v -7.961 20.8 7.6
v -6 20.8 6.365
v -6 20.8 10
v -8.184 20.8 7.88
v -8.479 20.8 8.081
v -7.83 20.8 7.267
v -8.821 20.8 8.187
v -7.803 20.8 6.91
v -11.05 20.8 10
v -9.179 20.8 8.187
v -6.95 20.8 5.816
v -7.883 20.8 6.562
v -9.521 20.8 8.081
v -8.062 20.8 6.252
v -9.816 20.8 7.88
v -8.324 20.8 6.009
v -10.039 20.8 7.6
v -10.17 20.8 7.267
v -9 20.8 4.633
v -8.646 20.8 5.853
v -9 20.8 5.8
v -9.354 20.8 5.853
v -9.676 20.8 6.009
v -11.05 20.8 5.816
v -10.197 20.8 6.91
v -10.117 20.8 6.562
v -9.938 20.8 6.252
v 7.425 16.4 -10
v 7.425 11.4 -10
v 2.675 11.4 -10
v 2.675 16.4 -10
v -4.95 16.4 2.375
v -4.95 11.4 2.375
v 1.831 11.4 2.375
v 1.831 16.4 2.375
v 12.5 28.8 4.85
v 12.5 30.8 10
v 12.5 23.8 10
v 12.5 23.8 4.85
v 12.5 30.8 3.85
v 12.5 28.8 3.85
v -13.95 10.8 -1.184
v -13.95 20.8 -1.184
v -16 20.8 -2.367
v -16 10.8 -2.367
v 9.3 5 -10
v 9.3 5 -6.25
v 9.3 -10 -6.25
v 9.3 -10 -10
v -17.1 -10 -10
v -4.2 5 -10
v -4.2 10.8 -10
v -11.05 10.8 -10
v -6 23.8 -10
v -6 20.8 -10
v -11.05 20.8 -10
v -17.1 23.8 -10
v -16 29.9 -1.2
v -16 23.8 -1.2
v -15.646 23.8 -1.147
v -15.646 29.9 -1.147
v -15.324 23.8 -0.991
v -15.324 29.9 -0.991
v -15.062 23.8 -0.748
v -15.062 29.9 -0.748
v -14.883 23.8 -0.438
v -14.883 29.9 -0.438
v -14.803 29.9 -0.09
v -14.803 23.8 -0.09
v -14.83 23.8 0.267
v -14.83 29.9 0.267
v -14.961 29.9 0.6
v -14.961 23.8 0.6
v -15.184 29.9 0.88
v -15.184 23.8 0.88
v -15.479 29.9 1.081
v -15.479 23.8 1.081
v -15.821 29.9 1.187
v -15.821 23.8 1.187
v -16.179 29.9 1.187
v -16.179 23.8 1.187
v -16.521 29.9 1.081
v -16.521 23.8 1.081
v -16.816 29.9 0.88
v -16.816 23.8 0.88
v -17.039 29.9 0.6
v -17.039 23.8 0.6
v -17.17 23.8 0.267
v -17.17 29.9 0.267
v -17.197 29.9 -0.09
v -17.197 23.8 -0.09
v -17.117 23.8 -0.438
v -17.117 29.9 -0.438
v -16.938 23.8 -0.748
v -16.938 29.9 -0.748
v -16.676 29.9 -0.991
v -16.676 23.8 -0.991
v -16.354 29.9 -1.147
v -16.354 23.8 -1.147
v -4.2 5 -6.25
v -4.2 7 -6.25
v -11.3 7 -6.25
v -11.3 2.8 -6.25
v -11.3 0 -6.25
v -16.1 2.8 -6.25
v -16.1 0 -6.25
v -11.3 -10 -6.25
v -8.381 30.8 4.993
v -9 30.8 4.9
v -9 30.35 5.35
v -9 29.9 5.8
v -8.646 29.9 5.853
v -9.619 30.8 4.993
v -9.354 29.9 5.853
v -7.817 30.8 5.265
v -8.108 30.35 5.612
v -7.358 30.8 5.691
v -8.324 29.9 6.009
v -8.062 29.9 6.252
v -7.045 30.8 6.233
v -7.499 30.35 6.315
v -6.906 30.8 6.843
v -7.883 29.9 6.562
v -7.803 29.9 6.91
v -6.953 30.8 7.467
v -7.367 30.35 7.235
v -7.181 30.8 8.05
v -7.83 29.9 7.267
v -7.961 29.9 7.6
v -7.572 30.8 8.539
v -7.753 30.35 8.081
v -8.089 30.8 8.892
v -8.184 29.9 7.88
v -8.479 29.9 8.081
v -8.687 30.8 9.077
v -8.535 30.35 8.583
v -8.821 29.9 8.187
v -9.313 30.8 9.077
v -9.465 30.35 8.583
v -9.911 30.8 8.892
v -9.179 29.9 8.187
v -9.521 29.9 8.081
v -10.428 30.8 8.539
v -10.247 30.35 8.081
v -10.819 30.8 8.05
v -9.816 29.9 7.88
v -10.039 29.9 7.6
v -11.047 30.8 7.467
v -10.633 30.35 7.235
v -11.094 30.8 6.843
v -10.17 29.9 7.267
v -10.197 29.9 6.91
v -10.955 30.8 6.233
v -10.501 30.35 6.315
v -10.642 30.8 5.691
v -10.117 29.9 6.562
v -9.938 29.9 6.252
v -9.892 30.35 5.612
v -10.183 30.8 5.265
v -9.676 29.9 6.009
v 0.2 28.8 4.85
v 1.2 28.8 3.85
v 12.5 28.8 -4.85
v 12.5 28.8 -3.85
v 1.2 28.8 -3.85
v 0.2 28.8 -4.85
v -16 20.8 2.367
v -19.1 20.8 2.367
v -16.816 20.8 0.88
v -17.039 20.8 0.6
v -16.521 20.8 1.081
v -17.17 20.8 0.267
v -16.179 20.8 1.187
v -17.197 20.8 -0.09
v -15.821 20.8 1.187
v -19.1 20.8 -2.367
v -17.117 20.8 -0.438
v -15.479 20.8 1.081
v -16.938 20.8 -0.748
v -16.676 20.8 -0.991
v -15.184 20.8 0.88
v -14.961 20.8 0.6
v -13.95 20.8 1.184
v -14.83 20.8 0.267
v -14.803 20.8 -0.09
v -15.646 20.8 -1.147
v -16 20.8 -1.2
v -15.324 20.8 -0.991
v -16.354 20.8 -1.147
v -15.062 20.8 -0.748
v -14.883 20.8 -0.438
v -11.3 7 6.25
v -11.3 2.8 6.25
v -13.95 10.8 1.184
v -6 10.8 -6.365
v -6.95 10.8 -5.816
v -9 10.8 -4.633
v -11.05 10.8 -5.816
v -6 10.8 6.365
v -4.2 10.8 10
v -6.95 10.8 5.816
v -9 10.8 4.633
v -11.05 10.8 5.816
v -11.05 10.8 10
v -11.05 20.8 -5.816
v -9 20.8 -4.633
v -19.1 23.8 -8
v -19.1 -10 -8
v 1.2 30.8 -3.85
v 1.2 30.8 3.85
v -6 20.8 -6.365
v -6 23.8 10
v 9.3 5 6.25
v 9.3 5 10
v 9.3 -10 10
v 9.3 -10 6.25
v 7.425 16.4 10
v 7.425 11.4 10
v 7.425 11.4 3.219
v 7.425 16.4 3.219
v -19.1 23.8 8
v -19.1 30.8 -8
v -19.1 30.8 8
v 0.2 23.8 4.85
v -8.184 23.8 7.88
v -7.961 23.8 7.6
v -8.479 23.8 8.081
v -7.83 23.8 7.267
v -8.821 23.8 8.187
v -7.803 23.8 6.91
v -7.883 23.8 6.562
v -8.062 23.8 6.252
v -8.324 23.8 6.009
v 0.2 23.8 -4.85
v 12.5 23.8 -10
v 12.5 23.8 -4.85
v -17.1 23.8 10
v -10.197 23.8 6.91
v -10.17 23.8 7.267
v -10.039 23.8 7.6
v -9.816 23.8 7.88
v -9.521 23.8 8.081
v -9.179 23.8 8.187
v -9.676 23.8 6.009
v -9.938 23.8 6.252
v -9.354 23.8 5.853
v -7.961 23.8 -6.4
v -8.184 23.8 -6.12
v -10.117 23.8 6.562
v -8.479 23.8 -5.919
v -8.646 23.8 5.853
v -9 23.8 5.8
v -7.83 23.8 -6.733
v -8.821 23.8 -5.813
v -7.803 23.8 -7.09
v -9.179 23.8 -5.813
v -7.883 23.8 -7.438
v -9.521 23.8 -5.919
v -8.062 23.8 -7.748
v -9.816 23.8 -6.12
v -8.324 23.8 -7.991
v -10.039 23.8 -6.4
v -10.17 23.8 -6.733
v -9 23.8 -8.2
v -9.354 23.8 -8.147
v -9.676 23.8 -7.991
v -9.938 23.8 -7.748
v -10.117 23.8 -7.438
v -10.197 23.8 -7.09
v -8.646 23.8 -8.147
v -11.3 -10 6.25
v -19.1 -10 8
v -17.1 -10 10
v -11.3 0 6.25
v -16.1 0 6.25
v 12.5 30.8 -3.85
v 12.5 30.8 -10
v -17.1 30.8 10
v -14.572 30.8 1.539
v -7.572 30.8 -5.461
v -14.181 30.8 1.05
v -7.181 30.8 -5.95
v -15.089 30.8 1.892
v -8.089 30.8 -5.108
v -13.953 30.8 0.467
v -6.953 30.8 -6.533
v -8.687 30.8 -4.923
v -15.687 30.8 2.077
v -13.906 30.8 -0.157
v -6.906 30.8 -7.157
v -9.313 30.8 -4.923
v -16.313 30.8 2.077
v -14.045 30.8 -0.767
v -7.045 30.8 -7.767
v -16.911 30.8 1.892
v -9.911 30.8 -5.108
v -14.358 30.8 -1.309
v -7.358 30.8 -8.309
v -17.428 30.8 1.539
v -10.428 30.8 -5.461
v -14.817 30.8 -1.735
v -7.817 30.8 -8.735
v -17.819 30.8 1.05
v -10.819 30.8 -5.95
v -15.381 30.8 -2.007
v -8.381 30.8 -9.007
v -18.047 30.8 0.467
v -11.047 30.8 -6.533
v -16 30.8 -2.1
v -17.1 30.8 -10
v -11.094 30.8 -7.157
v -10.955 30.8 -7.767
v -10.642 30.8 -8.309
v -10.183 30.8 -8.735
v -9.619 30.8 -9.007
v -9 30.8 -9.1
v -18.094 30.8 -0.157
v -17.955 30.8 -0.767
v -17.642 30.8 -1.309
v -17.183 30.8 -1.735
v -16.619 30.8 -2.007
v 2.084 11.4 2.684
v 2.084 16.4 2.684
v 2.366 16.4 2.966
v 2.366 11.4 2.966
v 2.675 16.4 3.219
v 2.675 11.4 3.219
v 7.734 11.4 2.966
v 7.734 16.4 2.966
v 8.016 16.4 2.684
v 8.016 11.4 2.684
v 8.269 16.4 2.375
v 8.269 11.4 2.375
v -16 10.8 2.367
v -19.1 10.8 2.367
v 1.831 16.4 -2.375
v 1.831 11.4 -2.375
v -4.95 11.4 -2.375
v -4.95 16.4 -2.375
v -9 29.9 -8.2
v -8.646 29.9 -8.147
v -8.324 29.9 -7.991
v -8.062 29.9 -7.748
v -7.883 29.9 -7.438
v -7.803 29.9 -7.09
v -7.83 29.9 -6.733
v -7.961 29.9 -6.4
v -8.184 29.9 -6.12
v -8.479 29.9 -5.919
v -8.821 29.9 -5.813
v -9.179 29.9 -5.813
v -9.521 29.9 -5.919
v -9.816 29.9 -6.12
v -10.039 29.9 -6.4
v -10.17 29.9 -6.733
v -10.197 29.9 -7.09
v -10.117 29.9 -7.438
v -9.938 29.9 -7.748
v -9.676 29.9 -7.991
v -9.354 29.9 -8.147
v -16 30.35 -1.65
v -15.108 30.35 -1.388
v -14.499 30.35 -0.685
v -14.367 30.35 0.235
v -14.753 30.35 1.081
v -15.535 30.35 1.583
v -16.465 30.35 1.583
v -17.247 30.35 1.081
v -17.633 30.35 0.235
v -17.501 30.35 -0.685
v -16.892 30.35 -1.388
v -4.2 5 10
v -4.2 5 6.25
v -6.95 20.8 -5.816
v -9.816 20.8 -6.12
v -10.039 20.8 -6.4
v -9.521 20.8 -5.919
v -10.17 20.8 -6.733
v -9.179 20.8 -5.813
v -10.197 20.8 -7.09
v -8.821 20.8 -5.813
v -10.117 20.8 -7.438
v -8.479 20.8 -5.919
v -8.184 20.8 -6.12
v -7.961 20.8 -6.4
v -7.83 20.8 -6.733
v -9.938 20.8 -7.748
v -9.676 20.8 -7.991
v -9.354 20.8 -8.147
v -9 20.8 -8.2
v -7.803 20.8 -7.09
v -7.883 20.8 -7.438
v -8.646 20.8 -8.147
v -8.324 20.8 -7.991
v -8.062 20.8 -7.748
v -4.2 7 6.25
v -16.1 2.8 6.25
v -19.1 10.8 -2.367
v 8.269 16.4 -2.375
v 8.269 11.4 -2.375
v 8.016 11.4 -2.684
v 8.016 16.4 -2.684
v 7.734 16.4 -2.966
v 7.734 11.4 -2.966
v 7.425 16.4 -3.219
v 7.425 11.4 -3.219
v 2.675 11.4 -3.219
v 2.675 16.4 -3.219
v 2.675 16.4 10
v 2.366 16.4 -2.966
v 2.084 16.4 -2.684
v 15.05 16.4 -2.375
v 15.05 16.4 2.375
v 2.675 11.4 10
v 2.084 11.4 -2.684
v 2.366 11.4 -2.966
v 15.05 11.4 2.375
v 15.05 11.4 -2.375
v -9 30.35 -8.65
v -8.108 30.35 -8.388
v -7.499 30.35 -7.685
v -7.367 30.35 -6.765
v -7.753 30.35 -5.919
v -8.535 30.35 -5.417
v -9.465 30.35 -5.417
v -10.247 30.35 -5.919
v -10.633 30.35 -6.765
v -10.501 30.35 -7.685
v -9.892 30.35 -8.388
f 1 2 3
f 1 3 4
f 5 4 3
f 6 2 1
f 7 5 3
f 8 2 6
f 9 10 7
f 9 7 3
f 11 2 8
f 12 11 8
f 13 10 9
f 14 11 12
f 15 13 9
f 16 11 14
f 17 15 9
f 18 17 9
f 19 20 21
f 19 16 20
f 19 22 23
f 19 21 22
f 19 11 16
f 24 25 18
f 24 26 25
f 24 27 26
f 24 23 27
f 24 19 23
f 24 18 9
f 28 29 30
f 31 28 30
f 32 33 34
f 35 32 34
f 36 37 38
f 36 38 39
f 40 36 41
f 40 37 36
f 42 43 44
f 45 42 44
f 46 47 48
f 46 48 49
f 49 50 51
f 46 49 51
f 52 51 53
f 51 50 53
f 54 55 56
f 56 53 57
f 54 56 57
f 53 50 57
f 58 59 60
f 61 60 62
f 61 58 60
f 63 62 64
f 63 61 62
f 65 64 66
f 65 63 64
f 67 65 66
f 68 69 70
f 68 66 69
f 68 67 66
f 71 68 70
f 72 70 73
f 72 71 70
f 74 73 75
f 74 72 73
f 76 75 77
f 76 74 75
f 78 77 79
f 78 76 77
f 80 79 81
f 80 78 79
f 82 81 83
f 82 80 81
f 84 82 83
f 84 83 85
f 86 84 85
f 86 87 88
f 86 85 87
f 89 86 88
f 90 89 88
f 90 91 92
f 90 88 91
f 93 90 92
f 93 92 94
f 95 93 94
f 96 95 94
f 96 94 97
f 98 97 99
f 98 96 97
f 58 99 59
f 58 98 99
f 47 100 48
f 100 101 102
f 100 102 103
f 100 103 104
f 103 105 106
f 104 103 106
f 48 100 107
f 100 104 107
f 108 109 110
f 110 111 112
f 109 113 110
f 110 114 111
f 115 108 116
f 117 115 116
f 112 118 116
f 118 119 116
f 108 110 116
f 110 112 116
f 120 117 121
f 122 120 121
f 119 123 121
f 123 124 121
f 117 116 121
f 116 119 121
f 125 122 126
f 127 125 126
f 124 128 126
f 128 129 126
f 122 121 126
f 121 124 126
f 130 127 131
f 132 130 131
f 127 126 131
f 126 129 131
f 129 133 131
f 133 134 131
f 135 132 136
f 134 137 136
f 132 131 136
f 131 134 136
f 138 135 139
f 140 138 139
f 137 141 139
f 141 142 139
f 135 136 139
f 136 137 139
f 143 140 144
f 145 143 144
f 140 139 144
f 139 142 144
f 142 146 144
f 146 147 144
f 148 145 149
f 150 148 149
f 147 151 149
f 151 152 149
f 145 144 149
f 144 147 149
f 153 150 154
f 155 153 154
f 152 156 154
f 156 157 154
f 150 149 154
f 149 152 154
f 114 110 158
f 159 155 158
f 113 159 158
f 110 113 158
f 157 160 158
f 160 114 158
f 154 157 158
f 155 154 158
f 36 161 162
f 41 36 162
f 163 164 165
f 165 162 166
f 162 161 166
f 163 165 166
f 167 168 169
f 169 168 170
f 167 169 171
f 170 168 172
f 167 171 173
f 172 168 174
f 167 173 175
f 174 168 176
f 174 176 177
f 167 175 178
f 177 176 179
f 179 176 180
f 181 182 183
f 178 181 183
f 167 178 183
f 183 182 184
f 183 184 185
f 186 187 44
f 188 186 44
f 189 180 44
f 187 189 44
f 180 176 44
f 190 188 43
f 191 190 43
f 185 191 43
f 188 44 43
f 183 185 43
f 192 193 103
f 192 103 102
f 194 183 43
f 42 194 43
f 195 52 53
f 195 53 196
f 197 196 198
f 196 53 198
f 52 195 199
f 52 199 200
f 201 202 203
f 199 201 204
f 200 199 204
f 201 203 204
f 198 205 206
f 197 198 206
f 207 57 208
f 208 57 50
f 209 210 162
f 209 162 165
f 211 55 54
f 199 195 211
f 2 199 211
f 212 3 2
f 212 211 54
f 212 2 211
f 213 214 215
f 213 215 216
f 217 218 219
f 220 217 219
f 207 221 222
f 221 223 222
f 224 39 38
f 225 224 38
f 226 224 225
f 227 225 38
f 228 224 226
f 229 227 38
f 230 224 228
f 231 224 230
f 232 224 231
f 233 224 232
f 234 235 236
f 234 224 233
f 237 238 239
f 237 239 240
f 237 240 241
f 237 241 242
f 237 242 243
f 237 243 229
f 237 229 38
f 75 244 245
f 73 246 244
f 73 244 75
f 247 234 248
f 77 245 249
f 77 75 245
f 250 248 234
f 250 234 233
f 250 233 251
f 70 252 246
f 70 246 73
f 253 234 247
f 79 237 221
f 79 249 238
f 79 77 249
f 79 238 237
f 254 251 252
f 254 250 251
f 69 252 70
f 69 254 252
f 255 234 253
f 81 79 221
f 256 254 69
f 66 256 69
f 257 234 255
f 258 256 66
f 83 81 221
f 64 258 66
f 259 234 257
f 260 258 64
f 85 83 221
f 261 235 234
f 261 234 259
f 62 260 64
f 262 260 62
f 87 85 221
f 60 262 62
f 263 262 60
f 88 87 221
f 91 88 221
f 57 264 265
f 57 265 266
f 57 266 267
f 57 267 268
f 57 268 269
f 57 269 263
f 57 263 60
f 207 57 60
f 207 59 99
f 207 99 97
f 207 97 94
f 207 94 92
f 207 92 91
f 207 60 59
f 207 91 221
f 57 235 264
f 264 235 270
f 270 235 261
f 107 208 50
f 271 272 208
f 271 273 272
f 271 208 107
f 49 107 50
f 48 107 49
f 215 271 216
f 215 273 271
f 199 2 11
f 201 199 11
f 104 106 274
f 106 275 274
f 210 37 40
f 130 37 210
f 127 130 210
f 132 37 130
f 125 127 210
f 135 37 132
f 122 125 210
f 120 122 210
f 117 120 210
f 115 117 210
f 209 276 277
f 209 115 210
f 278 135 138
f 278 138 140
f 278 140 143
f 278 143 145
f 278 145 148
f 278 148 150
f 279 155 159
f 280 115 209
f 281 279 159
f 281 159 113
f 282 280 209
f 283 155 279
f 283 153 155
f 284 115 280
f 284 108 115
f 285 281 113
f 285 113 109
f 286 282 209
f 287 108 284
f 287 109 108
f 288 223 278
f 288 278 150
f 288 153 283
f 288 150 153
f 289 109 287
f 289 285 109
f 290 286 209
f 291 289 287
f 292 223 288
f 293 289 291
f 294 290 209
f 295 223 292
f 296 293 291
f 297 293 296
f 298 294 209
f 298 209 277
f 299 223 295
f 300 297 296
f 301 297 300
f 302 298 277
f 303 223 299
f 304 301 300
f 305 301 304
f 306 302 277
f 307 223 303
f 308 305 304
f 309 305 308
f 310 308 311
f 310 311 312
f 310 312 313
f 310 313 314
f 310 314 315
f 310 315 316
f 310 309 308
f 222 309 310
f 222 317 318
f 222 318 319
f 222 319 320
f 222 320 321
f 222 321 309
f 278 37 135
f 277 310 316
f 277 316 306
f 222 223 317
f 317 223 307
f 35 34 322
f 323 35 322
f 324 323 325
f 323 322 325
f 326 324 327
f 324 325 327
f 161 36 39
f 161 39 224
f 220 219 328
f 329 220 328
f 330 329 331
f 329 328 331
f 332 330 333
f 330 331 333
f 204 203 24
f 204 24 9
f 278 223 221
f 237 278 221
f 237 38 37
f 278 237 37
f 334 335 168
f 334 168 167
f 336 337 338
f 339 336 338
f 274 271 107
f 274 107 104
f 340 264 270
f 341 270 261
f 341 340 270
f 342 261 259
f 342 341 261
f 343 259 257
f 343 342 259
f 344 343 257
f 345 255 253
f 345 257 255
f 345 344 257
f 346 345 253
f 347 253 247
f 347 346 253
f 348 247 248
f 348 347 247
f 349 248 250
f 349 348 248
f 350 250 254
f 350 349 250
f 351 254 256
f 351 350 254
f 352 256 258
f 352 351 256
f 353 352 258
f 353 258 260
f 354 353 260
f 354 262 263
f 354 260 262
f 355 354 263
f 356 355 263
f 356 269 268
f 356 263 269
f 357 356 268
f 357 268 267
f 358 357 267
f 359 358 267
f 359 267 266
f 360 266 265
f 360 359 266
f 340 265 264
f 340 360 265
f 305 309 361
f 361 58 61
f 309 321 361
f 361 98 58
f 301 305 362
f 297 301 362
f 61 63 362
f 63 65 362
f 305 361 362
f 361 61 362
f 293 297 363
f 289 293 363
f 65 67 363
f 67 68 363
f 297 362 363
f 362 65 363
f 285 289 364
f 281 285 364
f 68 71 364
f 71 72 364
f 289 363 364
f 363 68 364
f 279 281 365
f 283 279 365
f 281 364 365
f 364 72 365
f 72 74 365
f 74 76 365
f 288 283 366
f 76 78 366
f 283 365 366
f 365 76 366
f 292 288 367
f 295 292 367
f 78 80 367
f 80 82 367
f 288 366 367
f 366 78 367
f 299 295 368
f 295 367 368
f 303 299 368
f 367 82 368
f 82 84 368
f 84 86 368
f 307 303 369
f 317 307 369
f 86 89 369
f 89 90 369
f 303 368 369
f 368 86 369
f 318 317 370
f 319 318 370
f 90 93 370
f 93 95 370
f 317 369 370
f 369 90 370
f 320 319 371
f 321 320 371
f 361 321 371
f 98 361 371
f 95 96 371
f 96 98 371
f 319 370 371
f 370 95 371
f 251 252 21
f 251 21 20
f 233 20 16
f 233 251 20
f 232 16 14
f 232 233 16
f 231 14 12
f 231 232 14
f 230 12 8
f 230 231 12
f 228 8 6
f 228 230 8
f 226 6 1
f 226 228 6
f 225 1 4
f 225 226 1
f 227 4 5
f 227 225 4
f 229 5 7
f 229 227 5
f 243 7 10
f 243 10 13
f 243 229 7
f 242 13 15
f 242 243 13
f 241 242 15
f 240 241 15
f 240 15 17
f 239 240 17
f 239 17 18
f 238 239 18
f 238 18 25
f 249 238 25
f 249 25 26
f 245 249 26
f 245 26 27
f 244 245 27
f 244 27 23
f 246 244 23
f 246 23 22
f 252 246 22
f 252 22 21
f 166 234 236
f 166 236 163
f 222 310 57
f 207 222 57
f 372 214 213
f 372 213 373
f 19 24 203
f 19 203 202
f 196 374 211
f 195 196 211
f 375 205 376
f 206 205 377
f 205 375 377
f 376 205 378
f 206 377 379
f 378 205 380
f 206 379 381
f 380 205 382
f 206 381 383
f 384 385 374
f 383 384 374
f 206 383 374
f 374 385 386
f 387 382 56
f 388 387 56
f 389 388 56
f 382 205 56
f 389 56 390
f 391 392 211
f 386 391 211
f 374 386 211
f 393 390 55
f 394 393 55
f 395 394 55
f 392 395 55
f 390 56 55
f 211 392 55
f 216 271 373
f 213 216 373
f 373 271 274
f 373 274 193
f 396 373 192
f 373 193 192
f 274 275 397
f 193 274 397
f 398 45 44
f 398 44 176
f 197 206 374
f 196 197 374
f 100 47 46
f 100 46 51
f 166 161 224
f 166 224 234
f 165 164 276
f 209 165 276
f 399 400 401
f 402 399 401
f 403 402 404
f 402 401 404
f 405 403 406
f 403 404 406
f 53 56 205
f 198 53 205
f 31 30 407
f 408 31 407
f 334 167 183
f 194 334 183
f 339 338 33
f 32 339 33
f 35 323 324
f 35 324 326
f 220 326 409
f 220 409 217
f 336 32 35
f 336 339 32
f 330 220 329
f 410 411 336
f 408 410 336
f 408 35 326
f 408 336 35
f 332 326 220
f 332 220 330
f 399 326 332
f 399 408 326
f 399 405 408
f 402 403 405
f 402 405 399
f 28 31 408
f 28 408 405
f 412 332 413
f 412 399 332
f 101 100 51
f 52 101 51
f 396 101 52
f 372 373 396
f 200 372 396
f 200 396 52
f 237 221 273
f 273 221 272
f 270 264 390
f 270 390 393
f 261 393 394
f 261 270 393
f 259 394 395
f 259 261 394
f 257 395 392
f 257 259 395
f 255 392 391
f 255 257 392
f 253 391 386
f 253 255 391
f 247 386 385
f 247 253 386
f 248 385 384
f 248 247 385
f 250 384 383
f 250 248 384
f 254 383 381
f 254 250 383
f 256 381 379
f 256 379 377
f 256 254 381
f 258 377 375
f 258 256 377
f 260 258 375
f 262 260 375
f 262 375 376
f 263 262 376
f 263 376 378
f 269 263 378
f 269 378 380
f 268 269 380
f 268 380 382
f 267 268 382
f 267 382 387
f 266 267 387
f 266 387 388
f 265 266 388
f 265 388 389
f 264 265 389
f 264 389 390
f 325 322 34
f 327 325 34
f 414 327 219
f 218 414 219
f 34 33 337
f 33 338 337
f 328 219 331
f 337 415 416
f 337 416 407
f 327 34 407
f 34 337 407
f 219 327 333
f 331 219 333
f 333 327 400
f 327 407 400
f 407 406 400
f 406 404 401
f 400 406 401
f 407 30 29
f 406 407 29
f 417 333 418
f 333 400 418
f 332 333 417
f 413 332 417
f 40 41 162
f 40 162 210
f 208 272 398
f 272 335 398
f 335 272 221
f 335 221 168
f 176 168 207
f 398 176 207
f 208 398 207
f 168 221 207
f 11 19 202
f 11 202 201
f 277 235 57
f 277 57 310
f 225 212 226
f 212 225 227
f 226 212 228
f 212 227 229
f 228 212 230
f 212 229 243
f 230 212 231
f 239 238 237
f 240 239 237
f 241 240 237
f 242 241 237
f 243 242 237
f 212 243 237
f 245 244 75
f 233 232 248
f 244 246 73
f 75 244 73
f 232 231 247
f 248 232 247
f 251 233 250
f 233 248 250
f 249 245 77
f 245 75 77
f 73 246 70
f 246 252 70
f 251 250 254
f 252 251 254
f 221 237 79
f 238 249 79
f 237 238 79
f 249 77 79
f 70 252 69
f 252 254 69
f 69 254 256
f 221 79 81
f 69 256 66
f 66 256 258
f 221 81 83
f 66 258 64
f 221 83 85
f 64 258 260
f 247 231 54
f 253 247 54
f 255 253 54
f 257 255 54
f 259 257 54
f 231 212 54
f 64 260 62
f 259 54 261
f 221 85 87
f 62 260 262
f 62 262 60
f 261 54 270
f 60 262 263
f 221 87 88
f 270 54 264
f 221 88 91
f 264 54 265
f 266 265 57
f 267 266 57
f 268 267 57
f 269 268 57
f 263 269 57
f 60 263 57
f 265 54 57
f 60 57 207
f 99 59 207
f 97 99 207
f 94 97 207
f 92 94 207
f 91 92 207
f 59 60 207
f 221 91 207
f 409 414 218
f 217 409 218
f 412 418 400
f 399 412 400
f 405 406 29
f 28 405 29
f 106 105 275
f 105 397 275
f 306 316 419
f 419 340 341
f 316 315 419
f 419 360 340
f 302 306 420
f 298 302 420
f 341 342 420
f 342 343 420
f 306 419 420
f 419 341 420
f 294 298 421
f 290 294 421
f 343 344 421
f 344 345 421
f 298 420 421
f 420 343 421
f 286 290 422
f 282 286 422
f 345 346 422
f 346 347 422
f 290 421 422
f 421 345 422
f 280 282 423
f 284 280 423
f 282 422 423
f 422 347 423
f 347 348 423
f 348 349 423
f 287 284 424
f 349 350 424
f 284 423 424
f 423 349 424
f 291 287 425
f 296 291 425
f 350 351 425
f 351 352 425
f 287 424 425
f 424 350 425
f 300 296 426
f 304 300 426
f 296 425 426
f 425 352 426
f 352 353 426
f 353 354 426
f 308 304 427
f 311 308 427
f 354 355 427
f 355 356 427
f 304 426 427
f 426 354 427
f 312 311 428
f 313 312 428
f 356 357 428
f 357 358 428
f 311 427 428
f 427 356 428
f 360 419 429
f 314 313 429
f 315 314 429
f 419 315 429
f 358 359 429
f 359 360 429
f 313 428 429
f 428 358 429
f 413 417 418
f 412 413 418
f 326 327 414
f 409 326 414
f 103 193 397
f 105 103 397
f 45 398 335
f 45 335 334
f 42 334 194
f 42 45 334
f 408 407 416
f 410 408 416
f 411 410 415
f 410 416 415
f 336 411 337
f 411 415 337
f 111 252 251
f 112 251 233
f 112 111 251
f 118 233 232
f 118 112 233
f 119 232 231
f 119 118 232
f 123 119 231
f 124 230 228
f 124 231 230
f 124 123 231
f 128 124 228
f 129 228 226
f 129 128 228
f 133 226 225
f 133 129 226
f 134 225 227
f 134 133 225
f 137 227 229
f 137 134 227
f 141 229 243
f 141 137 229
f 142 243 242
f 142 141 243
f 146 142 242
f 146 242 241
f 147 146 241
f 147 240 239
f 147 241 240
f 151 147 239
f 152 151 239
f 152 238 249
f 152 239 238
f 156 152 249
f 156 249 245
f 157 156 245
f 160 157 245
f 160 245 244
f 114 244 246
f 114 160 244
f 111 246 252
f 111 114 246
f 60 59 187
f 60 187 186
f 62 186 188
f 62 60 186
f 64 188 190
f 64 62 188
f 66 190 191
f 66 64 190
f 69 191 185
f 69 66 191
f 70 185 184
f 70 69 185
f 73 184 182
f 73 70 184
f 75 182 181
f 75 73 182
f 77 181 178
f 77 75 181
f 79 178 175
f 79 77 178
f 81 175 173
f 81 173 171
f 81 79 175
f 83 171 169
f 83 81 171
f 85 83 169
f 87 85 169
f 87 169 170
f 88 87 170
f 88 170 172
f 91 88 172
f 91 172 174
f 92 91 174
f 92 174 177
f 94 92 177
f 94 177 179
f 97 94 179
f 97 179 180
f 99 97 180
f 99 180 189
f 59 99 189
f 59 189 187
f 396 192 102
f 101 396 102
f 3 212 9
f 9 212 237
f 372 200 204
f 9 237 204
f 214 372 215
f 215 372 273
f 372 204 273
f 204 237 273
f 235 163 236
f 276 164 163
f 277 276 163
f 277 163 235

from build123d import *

# Parameters (mm, degrees)
SKETCH1_W                = 22.6
SKETCH1_H                = 15.7
SKETCH1_H_2              = 4.2
BOSS_EXTRUDE1_DEPTH      = 6.25
BOSS_EXTRUDE2_DEPTH      = 4.4
SKETCH4_W                = 9.7
SKETCH4_H                = 9.7
BOSS_EXTRUDE3_DEPTH      = 5
BOSS_EXTRUDE9_DEPTH      = 5
SKETCH8_R                = 3.3
BOSS_EXTRUDE5_DEPTH      = 5.4
BOSS_EXTRUDE5_DRAFT      = 13
BOSS_EXTRUDE6_DEPTH      = 10
SKETCH9_W                = 9.7
SKETCH9_H                = 5
CUT_EXTRUDE1_DEPTH       = 12.3
BOSS_EXTRUDE7_REACH      = 45.909
SKETCH10_W               = 6.15
SKETCH10_H               = 2
BOSS_EXTRUDE8_START      = -19.3
SKETCH11_W               = 7.7
SKETCH11_H               = 2
BOSS_EXTRUDE8_DEPTH      = 20.3
CHAMFER1_SIZE            = 2
SURFACE_EXTRUDE1_1_BACK  = 25
SURFACE_EXTRUDE1_1_DEPTH = 35
SURFACE_EXTRUDE1_2_BACK  = 25
SURFACE_EXTRUDE1_2_DEPTH = 35
CUT_EXTRUDE2_START       = -3
CUT_EXTRUDE2_DEPTH       = 10
CUT_EXTRUDE3_START       = -12.4
SKETCH15_R               = 1.2
CUT_EXTRUDE3_DEPTH       = 10
CHAMFER2_SIZE            = 0.9
SKETCH16_W               = 3.75
SKETCH16_H               = 15
CUT_EXTRUDE4_DEPTH       = 2
MOVE_START               = -6
MOVE_FACE1_DEPTH         = 1.8


# Read off the part's stored shape, not the designer's step: Move Face1
with BuildPart() as part:
    # Sketch1 → Boss-Extrude1 (new, symmetric)
    with BuildSketch(Plane.XY):
        with Locations((0, -7.85)):
            Rectangle(SKETCH1_W, SKETCH1_H)
        Polygon((-16.1, 0), (-11.3, 0), (11.3, 0), (16.1, 0), (16.1, 2.8), (11.3, 2.8), (-11.3, 2.8), (-16.1, 2.8), align=None)
        with Locations((0, 4.9)):
            Rectangle(SKETCH1_W, SKETCH1_H_2)
    extrude(amount=BOSS_EXTRUDE1_DEPTH, both=True)

    # Sketch2 → Boss-Extrude2 (add)
    with BuildSketch(Plane(origin=(0, 7, 0), x_dir=(1, 0, 0), z_dir=(0, 1, 0))):
        with BuildLine():
            ThreePointArc((-0.486469995, -2.9), (11.3, 0), (-0.486469995, 2.9))
            ThreePointArc((-0.486469995, 2.9), (-3.386469995, 0), (-0.486469995, -2.9))
        make_face()
    extrude(amount=BOSS_EXTRUDE2_DEPTH)


with BuildPart() as body_2:
    # Sketch4 → Boss-Extrude3 (new body)
    with BuildSketch(Plane(origin=(0, 28.8, 0), x_dir=(-1, 0, 0), z_dir=(0, -1, 0))):
        with Locations((-5.05, 0)):
            Rectangle(SKETCH4_W, SKETCH4_H)
    extrude(amount=BOSS_EXTRUDE3_DEPTH)


with BuildPart() as body_3:
    # Sketch12 → Boss-Extrude9 (new body)
    with BuildSketch(Plane(origin=(0, 11.4, 0), x_dir=(1, 0, 0), z_dir=(0, 1, 0))):
        with BuildLine():
            Line((-4.95, -2.375), (1.831401703, -2.375))
            ThreePointArc((1.831401703, -2.375), (2.221572875, -2.828427125), (2.675, -3.218598297))
            Line((2.675, -3.218598297), (2.675, -10))
            Line((2.675, -10), (7.425, -10))
            Line((7.425, -10), (7.425, -3.218598297))
            ThreePointArc((7.425, -3.218598297), (7.878427125, -2.828427125), (8.268598297, -2.375))
            Line((8.268598297, -2.375), (15.05, -2.375))
            Line((15.05, -2.375), (15.05, 2.375))
            Line((15.05, 2.375), (8.268598297, 2.375))
            ThreePointArc((8.268598297, 2.375), (7.878427125, 2.828427125), (7.425, 3.218598297))
            Line((7.425, 3.218598297), (7.425, 10))
            Line((7.425, 10), (2.675, 10))
            Line((2.675, 10), (2.675, 3.218598297))
            ThreePointArc((2.675, 3.218598297), (2.221572875, 2.828427125), (1.831401703, 2.375))
            Line((1.831401703, 2.375), (-4.95, 2.375))
            Line((-4.95, 2.375), (-4.95, -2.375))
        make_face()
    extrude(amount=BOSS_EXTRUDE9_DEPTH)


with BuildPart() as boss_extrude5_tool:
    # Sketch8 → Boss-Extrude5 (with draft: the straight prism first)
    with BuildSketch(Plane(origin=(0, 18.4, 0), x_dir=(-1, 0, 0), z_dir=(0, -1, 0))):
        with Locations((-5.05, 0)):
            Circle(SKETCH8_R)
    extrude(amount=-BOSS_EXTRUDE5_DEPTH)
    # Boss-Extrude5: the draft: its side faces are tilted about the plane it starts from
    boss_extrude5_sides = [boss_extrude5_tool.faces().sort_by_distance(p)[0] for p in [
        (8.35, 21.1, 0),
    ]]
    draft(boss_extrude5_sides, Plane(origin=(0, 18.4, 0), x_dir=(-1, 0, 0), z_dir=(0, -1, 0)), BOSS_EXTRUDE5_DRAFT)


with BuildPart() as body_2_1:
    add(body_2.part)

    # Boss-Extrude5: add boss_extrude5_tool
    add(boss_extrude5_tool.part)


with BuildPart() as body_4:
    # Sketch3 → Boss-Extrude6 (new, symmetric)
    with BuildSketch(Plane.XY):
        Polygon((12.5, 28.8), (-19.1, 28.8), (-19.1, -10), (11.3, -10), (11.3, 5), (-6, 5), (-6, 23.8), (12.5, 23.8), align=None)
    extrude(amount=BOSS_EXTRUDE6_DEPTH, both=True)

    # Combine1: cut part, body 2
    add(part.part, mode=Mode.SUBTRACT)
    add(body_2_1.part, mode=Mode.SUBTRACT)

    # Sketch9 → Cut-Extrude1 (cut)
    with BuildSketch(Plane(origin=(0.2, 0, 0), x_dir=(0, 0, -1), z_dir=(1, 0, 0))):
        with Locations((0, 26.3)):
            Rectangle(SKETCH9_W, SKETCH9_H)
    extrude(amount=CUT_EXTRUDE1_DEPTH, mode=Mode.SUBTRACT)

    # Boss-Extrude7: up to this face of the body (flat: up to its plane)
    boss_extrude7_end = Plane(body_4.part.faces().sort_by_distance((-19.1, 9.4, 0))[0])
    # Sketch10 → Boss-Extrude7 (add, up to the picked face)
    with BuildSketch(Plane(origin=(12.5, 0, 0), x_dir=(0, 0, -1), z_dir=(1, 0, 0)), mode=Mode.PRIVATE) as boss_extrude7_sk1:
        with Locations((6.925, 29.8)):
            Rectangle(SKETCH10_W, SKETCH10_H)
    boss_extrude7_tool1 = split(extrude(boss_extrude7_sk1.sketch, amount=-BOSS_EXTRUDE7_REACH, mode=Mode.PRIVATE), bisect_by=boss_extrude7_end, keep=Keep.BOTH, mode=Mode.PRIVATE)
    # Sketch10 → Boss-Extrude7 (add, up to the picked face)
    with BuildSketch(Plane(origin=(12.5, 0, 0), x_dir=(0, 0, -1), z_dir=(1, 0, 0)), mode=Mode.PRIVATE) as boss_extrude7_sk2:
        with Locations((-6.925, 29.8)):
            Rectangle(SKETCH10_W, SKETCH10_H)
    boss_extrude7_tool2 = split(extrude(boss_extrude7_sk2.sketch, amount=-BOSS_EXTRUDE7_REACH, mode=Mode.PRIVATE), bisect_by=boss_extrude7_end, keep=Keep.BOTH, mode=Mode.PRIVATE)
    add(boss_extrude7_tool1.solids().sort_by(Axis((12.5, 29.8, -6.925), (-1, 0, 0)))[0])
    add(boss_extrude7_tool2.solids().sort_by(Axis((12.5, 29.8, 6.925), (-1, 0, 0)))[0])

    # Sketch11 → Boss-Extrude8 (add)
    with BuildSketch(Plane(origin=(0.2, 0, 0), x_dir=(0, 0, -1), z_dir=(1, 0, 0)).offset(BOSS_EXTRUDE8_START)):
        with Locations((0, 29.8)):
            Rectangle(SKETCH11_W, SKETCH11_H)
    extrude(amount=BOSS_EXTRUDE8_DEPTH)

    # Chamfer1
    chamfer1_edges = [body_4.edges().sort_by_distance(p)[0] for p in [
        (-19.1, 10.4, -10),
        (-19.1, 10.4, 10),
    ]]
    chamfer(chamfer1_edges, length=CHAMFER1_SIZE)


with BuildPart() as body_3_2:
    # Split1: the piece behind the surface
    add(body_4.part)
    # Surface-Extrude1: a surface, the sketch's curves swept straight by 35 mm
    with BuildLine(Plane.XY.offset(10).offset(-SURFACE_EXTRUDE1_1_BACK), mode=Mode.PRIVATE) as surface_extrude1_1_path:
        Line((-6, 23.8), (-38.363313576, 23.8))
    surface_extrude1_1 = Shell.extrude(surface_extrude1_1_path.wire(), (0 * SURFACE_EXTRUDE1_1_DEPTH, 0 * SURFACE_EXTRUDE1_1_DEPTH, 1 * SURFACE_EXTRUDE1_1_DEPTH))
    split(bisect_by=surface_extrude1_1, keep=Keep.BOTTOM)


with BuildPart() as body_4_1:
    add(body_4.part)

    # Split1: split by a surface, the side it looks to stays
    # Surface-Extrude1: a surface, the sketch's curves swept straight by 35 mm
    with BuildLine(Plane.XY.offset(10).offset(-SURFACE_EXTRUDE1_2_BACK), mode=Mode.PRIVATE) as surface_extrude1_2_path:
        Line((-6, 23.8), (-38.363313576, 23.8))
    surface_extrude1_2 = Shell.extrude(surface_extrude1_2_path.wire(), (0 * SURFACE_EXTRUDE1_2_DEPTH, 0 * SURFACE_EXTRUDE1_2_DEPTH, 1 * SURFACE_EXTRUDE1_2_DEPTH))
    split(bisect_by=surface_extrude1_2, keep=Keep.TOP)

    # Sketch14 → Cut-Extrude2 (cut)
    with BuildSketch(Plane(origin=(0, 23.8, 0), x_dir=(1, 0, 0), z_dir=(0, 1, 0)).offset(CUT_EXTRUDE2_START)):
        Polygon((-18.05, 1.183568052), (-16, 2.367136104), (-19.1, 2.367136104), (-19.1, -2.367136104), (-16, -2.367136104), (-18.05, -1.183568052), align=None)
        Polygon((-16, -2.367136104), (-13.95, -1.183568052), (-13.95, 1.183568052), (-16, 2.367136104), (-18.05, 1.183568052), (-18.05, -1.183568052), align=None)
        Polygon((-6.95, 8.183568052), (-9, 9.367136104), (-11.05, 8.183568052), (-11.05, 5.816431948), (-9, 4.632863896), (-6.95, 5.816431948), align=None)
        Polygon((-11.05, 10), (-11.05, 8.183568052), (-9, 9.367136104), (-6.95, 8.183568052), (-6.95, 5.816431948), (-6, 6.364914704), (-6, 10), align=None)
        Polygon((-11.05, -8.183568052), (-11.05, -5.816431948), (-9, -4.632863896), (-6.95, -5.816431948), (-6.95, -8.183568052), (-9, -9.367136104), align=None)
        Polygon((-6, -10), (-6, -6.364914704), (-6.95, -5.816431948), (-6.95, -8.183568052), (-9, -9.367136104), (-11.05, -8.183568052), (-11.05, -10), align=None)
    extrude(amount=-CUT_EXTRUDE2_DEPTH, mode=Mode.SUBTRACT)


with BuildPart() as cut_extrude3_tool:
    # Sketch15 → Cut-Extrude3 (new body)
    with BuildSketch(Plane(origin=(0, 18.4, 0), x_dir=(-1, 0, 0), z_dir=(0, -1, 0)).offset(CUT_EXTRUDE3_START)):
        with Locations(Location((9, 7, 0), (0, 0, 90))):
            Circle(SKETCH15_R)
        with Locations(Location((9, -7, 0), (0, 0, 90))):
            Circle(SKETCH15_R)
        with Locations(Location((16, 0, 0), (0, 0, 90))):
            Circle(SKETCH15_R)
    extrude(amount=CUT_EXTRUDE3_DEPTH)


with BuildPart() as body_4_2:
    add(body_4_1.part)

    # Cut-Extrude3: cut by cut_extrude3_tool
    add(cut_extrude3_tool.part, mode=Mode.SUBTRACT)

    # Sketch16 → Cut-Extrude4 (cut)
    with BuildSketch(Plane(origin=(11.3, 0, 0), x_dir=(0, 0, -1), z_dir=(1, 0, 0))):
        with Locations((8.125, -2.5)):
            Rectangle(SKETCH16_W, SKETCH16_H)
        with Locations((-8.125, -2.5)):
            Rectangle(SKETCH16_W, SKETCH16_H)
    extrude(amount=-CUT_EXTRUDE4_DEPTH, mode=Mode.SUBTRACT)

    # Move Face1 outline → Move Face1 (add)
    with BuildSketch(Plane.YZ.offset(MOVE_START)):
        Polygon((7, 6.25), (7, -6.25), (5, -6.25), (5, -10), (10.8, -10), (10.8, 10), (5, 10), (5, 6.25), align=None)
    extrude(amount=MOVE_FACE1_DEPTH)


with BuildPart() as body_3_2_1:
    add(body_3_2.part)

    # Cut-Extrude3: cut by cut_extrude3_tool
    add(cut_extrude3_tool.part, mode=Mode.SUBTRACT)

    # Chamfer2
    chamfer2_edges = [body_3_2_1.edges().sort_by_distance(p)[0] for p in [
        (-9, 30.8, -5.8),
        (-9, 30.8, 8.2),
        (-16, 30.8, 1.2),
    ]]
    chamfer(chamfer2_edges, length=CHAMFER2_SIZE)


solid = Compound([body_3.part, body_4_2.part, body_3_2_1.part])
